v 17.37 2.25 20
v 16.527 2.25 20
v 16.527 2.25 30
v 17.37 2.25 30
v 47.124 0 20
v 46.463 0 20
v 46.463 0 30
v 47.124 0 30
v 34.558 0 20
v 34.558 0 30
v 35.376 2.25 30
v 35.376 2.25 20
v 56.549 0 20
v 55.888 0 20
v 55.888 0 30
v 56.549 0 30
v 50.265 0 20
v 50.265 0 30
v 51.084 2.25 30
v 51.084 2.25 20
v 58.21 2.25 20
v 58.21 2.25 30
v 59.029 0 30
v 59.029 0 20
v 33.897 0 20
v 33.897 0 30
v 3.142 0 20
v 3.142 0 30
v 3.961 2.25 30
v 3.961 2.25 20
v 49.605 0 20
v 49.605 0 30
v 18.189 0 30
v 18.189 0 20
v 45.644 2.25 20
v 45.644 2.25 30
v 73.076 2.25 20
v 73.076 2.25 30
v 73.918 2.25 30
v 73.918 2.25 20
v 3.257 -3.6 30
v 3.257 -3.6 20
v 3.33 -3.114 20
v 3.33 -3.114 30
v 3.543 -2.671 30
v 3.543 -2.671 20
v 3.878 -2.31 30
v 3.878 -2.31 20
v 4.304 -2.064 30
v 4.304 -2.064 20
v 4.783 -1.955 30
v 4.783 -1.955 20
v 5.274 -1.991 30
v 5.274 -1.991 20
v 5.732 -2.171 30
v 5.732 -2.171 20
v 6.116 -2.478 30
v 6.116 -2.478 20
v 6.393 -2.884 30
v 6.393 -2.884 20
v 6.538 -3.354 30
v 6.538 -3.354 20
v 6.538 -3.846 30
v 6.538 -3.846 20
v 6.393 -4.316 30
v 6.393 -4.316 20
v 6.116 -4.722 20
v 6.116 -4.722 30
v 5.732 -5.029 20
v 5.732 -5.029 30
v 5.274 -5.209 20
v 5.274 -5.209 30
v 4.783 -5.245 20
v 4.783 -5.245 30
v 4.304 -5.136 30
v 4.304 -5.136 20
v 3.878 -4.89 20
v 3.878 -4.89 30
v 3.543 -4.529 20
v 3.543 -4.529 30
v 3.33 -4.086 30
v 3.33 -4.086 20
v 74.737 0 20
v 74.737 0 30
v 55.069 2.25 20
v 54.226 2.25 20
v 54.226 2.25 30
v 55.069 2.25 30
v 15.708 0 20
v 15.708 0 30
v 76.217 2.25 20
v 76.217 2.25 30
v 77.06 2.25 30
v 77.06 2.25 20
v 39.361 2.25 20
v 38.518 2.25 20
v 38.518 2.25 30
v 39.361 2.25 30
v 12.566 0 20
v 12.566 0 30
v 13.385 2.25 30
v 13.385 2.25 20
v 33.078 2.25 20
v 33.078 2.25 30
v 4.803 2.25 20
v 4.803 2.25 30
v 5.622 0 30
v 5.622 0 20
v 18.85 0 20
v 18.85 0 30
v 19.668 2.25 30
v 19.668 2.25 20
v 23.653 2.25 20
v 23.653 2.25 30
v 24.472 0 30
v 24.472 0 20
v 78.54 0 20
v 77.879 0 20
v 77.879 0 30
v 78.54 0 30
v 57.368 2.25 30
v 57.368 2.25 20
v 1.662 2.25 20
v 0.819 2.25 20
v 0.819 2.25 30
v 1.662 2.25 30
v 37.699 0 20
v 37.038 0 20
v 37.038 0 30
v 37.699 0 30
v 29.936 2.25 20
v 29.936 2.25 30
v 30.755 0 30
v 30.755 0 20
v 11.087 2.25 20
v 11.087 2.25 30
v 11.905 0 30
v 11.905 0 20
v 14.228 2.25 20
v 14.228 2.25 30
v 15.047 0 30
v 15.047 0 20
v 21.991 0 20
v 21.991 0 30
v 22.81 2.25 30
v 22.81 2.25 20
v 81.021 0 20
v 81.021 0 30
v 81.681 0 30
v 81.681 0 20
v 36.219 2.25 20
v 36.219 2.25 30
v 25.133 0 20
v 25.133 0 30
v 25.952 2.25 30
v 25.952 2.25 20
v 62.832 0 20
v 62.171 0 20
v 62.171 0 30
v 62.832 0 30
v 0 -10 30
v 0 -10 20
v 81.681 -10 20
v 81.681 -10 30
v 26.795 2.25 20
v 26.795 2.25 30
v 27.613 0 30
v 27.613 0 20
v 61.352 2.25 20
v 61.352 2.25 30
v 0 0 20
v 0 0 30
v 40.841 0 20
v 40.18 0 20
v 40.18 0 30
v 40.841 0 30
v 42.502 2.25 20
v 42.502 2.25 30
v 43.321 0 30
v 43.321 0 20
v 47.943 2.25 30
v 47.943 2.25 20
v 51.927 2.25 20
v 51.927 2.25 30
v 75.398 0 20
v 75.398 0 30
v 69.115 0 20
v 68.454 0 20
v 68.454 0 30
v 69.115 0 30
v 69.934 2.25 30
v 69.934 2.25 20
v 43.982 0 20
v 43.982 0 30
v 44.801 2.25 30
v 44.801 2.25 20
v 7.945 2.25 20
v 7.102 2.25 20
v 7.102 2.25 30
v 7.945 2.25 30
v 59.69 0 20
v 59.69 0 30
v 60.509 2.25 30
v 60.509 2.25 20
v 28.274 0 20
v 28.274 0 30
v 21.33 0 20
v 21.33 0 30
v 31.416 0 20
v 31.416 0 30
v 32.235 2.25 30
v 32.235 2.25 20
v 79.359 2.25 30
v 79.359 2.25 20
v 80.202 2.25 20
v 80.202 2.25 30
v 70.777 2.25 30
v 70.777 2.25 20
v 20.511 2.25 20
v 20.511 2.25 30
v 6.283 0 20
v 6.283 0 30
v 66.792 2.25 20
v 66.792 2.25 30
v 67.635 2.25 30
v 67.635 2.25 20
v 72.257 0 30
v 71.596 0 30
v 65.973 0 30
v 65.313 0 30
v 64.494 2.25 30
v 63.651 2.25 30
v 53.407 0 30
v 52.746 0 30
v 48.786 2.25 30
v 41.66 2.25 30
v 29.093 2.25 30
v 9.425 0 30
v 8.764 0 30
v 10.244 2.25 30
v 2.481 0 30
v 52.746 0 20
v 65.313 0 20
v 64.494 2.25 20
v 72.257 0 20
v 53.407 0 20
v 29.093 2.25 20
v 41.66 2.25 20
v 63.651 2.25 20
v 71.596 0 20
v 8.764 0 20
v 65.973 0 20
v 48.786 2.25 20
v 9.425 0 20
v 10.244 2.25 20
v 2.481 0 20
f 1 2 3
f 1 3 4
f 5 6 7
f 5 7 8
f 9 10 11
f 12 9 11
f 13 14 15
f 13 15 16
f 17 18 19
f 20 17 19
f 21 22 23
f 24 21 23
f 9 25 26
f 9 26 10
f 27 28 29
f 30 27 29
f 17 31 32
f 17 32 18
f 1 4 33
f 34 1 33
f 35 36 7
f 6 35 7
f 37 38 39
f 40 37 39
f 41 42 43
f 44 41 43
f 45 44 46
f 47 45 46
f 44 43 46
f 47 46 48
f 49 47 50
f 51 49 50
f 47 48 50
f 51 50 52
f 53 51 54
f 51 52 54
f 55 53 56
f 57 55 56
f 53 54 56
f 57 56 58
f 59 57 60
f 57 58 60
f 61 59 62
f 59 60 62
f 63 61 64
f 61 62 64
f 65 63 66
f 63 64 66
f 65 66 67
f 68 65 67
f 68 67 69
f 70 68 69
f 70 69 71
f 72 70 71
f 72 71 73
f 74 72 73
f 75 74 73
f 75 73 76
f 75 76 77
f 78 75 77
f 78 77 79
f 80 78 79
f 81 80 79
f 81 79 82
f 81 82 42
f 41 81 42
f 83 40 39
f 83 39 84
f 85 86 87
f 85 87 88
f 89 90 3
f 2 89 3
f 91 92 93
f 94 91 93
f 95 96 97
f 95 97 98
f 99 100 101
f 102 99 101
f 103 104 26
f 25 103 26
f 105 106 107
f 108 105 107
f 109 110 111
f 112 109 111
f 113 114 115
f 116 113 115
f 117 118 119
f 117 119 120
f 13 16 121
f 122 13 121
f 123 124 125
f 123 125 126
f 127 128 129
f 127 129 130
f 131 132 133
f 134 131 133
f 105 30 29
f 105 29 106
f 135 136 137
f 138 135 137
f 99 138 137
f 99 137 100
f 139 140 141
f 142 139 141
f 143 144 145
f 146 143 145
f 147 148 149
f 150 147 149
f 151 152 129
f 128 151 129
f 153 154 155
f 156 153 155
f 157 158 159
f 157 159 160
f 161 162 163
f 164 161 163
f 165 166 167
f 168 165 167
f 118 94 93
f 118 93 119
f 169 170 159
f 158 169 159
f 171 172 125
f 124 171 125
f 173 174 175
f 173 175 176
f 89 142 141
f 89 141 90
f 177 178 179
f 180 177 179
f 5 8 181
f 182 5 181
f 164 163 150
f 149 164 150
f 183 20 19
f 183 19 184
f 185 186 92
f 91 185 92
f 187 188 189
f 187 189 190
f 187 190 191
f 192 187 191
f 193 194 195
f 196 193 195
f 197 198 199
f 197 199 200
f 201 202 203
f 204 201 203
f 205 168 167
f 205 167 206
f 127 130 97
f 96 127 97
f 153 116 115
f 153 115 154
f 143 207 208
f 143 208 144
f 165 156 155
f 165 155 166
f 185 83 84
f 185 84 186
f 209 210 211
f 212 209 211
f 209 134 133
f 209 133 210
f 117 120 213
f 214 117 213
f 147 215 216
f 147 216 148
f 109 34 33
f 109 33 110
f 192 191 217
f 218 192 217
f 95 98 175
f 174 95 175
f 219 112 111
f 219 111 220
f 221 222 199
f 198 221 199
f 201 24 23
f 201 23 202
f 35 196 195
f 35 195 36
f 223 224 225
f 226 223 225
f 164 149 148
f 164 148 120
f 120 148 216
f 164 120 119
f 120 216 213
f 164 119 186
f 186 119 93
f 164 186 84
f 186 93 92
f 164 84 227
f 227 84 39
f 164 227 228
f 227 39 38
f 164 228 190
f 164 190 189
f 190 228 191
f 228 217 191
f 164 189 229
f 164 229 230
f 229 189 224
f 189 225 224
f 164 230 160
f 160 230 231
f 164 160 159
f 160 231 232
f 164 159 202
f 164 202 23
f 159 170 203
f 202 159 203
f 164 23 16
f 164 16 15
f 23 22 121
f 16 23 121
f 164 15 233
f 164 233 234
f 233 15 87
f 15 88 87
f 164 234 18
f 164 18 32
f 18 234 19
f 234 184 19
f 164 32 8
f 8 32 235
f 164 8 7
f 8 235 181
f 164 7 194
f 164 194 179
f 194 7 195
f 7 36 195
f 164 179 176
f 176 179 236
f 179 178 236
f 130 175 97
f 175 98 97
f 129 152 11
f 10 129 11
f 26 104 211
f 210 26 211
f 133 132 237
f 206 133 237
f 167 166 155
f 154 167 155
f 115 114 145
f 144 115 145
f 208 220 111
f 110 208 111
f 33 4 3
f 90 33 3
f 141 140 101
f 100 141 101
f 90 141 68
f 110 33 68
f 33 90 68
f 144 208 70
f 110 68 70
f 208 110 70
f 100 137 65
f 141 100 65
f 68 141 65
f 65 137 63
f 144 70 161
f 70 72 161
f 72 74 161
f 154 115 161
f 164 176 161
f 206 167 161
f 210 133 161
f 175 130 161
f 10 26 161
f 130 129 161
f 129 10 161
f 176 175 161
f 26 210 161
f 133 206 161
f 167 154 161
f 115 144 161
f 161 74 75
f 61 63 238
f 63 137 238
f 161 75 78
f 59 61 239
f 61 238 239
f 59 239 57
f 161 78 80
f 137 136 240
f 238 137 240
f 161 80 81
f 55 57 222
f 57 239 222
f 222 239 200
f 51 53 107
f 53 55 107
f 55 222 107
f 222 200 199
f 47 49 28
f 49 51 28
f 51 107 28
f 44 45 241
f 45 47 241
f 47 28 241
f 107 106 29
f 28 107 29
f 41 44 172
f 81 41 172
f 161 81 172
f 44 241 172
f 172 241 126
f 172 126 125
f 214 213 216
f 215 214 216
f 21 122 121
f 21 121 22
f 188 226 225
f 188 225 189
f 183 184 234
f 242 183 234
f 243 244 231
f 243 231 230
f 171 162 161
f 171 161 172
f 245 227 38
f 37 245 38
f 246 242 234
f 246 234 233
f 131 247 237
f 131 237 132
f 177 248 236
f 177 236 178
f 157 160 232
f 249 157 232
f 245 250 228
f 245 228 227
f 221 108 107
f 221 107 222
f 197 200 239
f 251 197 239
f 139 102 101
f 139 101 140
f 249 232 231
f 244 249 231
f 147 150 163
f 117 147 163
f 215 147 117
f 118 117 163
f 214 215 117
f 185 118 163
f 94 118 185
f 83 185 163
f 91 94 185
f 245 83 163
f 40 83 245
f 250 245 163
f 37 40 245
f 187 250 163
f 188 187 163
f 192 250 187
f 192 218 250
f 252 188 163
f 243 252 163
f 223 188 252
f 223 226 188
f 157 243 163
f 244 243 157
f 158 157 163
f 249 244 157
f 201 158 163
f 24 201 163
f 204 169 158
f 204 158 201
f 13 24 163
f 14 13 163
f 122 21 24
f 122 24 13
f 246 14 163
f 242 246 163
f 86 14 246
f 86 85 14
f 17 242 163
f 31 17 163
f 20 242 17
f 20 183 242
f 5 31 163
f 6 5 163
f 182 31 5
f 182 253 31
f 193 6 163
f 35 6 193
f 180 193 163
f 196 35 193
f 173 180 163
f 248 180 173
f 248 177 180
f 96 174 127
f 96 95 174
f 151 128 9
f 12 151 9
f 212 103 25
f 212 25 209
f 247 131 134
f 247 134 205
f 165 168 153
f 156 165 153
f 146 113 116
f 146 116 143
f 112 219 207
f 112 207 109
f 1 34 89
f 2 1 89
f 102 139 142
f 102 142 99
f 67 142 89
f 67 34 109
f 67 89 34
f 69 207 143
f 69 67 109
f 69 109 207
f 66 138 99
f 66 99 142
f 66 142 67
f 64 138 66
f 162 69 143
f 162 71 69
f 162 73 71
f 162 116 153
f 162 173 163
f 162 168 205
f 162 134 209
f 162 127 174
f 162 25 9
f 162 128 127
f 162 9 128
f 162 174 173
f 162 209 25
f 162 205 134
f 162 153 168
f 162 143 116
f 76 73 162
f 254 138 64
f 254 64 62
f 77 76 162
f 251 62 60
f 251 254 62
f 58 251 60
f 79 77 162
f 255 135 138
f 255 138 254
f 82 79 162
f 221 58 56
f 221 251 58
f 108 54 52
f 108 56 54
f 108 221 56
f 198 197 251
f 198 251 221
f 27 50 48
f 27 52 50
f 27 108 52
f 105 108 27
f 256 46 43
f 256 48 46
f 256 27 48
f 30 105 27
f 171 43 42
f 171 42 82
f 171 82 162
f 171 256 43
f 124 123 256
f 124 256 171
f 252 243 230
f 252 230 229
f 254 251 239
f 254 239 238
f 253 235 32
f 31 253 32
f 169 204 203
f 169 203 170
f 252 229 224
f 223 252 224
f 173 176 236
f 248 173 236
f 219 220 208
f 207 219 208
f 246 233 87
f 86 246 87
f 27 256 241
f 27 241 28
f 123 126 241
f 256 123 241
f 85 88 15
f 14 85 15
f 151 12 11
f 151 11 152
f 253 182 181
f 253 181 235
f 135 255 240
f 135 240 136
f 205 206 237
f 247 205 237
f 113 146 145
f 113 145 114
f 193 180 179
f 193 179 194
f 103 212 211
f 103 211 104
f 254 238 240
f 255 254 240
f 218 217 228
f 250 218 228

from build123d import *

# Parameters (mm, degrees)
SKETCH_1_W             = 81.681408993
SKETCH_1_H             = 10
EXTRUDE_1_DEPTH        = 30
EXTRUDE_2_DEPTH        = 30
PATTERN_LINEAR_1_COUNT = 26
PATTERN_LINEAR_1_PITCH = 3.141592654
SKETCH_3_W             = 87.309380436
SKETCH_3_H             = 21.857368967
CUT_EXTRUDE_1_DEPTH    = 20
SKETCH_4_R             = 1.65
CUT_EXTRUDE_4_DEPTH    = 83.8966379


with BuildPart() as part:
    # 草图1 → 拉伸1 (new body)
    with BuildSketch(Plane.XY):
        with Locations((40.840704497, -5)):
            Rectangle(SKETCH_1_W, SKETCH_1_H)
    extrude(amount=EXTRUDE_1_DEPTH)

    # 草图2 → 拉伸2 (add)
    with BuildSketch(Plane.XY.offset(30)):
        Polygon((0, 0), (0.818933027, 2.25), (1.661788885, 2.25), (2.480721912, 0), align=None)
    extrude_2 = extrude(amount=-EXTRUDE_2_DEPTH)

    # 阵列(线性)1: 拉伸2 ×26
    with Locations(*[(i * PATTERN_LINEAR_1_PITCH, 0, 0) for i in range(1, PATTERN_LINEAR_1_COUNT)]):
        add(extrude_2)

    # 草图3 → 切除-拉伸1 (cut)
    with BuildSketch(Plane(origin=(0, 0, 0), x_dir=(-1, 0, 0), z_dir=(0, 0, -1))):
        with Locations((-41.261038515, -3.604772773)):
            Rectangle(SKETCH_3_W, SKETCH_3_H)
    extrude(amount=-CUT_EXTRUDE_1_DEPTH, mode=Mode.SUBTRACT)

    # 草图4 → 切除-拉伸4 (cut, through all)
    with BuildSketch(Plane(origin=(0, 0, 20), x_dir=(-1, 0, 0), z_dir=(0, 0, -1))):
        with Locations((-4.906524017, -3.6)):
            Circle(SKETCH_4_R)
    extrude(amount=-CUT_EXTRUDE_4_DEPTH, mode=Mode.SUBTRACT)


solid = part.part
